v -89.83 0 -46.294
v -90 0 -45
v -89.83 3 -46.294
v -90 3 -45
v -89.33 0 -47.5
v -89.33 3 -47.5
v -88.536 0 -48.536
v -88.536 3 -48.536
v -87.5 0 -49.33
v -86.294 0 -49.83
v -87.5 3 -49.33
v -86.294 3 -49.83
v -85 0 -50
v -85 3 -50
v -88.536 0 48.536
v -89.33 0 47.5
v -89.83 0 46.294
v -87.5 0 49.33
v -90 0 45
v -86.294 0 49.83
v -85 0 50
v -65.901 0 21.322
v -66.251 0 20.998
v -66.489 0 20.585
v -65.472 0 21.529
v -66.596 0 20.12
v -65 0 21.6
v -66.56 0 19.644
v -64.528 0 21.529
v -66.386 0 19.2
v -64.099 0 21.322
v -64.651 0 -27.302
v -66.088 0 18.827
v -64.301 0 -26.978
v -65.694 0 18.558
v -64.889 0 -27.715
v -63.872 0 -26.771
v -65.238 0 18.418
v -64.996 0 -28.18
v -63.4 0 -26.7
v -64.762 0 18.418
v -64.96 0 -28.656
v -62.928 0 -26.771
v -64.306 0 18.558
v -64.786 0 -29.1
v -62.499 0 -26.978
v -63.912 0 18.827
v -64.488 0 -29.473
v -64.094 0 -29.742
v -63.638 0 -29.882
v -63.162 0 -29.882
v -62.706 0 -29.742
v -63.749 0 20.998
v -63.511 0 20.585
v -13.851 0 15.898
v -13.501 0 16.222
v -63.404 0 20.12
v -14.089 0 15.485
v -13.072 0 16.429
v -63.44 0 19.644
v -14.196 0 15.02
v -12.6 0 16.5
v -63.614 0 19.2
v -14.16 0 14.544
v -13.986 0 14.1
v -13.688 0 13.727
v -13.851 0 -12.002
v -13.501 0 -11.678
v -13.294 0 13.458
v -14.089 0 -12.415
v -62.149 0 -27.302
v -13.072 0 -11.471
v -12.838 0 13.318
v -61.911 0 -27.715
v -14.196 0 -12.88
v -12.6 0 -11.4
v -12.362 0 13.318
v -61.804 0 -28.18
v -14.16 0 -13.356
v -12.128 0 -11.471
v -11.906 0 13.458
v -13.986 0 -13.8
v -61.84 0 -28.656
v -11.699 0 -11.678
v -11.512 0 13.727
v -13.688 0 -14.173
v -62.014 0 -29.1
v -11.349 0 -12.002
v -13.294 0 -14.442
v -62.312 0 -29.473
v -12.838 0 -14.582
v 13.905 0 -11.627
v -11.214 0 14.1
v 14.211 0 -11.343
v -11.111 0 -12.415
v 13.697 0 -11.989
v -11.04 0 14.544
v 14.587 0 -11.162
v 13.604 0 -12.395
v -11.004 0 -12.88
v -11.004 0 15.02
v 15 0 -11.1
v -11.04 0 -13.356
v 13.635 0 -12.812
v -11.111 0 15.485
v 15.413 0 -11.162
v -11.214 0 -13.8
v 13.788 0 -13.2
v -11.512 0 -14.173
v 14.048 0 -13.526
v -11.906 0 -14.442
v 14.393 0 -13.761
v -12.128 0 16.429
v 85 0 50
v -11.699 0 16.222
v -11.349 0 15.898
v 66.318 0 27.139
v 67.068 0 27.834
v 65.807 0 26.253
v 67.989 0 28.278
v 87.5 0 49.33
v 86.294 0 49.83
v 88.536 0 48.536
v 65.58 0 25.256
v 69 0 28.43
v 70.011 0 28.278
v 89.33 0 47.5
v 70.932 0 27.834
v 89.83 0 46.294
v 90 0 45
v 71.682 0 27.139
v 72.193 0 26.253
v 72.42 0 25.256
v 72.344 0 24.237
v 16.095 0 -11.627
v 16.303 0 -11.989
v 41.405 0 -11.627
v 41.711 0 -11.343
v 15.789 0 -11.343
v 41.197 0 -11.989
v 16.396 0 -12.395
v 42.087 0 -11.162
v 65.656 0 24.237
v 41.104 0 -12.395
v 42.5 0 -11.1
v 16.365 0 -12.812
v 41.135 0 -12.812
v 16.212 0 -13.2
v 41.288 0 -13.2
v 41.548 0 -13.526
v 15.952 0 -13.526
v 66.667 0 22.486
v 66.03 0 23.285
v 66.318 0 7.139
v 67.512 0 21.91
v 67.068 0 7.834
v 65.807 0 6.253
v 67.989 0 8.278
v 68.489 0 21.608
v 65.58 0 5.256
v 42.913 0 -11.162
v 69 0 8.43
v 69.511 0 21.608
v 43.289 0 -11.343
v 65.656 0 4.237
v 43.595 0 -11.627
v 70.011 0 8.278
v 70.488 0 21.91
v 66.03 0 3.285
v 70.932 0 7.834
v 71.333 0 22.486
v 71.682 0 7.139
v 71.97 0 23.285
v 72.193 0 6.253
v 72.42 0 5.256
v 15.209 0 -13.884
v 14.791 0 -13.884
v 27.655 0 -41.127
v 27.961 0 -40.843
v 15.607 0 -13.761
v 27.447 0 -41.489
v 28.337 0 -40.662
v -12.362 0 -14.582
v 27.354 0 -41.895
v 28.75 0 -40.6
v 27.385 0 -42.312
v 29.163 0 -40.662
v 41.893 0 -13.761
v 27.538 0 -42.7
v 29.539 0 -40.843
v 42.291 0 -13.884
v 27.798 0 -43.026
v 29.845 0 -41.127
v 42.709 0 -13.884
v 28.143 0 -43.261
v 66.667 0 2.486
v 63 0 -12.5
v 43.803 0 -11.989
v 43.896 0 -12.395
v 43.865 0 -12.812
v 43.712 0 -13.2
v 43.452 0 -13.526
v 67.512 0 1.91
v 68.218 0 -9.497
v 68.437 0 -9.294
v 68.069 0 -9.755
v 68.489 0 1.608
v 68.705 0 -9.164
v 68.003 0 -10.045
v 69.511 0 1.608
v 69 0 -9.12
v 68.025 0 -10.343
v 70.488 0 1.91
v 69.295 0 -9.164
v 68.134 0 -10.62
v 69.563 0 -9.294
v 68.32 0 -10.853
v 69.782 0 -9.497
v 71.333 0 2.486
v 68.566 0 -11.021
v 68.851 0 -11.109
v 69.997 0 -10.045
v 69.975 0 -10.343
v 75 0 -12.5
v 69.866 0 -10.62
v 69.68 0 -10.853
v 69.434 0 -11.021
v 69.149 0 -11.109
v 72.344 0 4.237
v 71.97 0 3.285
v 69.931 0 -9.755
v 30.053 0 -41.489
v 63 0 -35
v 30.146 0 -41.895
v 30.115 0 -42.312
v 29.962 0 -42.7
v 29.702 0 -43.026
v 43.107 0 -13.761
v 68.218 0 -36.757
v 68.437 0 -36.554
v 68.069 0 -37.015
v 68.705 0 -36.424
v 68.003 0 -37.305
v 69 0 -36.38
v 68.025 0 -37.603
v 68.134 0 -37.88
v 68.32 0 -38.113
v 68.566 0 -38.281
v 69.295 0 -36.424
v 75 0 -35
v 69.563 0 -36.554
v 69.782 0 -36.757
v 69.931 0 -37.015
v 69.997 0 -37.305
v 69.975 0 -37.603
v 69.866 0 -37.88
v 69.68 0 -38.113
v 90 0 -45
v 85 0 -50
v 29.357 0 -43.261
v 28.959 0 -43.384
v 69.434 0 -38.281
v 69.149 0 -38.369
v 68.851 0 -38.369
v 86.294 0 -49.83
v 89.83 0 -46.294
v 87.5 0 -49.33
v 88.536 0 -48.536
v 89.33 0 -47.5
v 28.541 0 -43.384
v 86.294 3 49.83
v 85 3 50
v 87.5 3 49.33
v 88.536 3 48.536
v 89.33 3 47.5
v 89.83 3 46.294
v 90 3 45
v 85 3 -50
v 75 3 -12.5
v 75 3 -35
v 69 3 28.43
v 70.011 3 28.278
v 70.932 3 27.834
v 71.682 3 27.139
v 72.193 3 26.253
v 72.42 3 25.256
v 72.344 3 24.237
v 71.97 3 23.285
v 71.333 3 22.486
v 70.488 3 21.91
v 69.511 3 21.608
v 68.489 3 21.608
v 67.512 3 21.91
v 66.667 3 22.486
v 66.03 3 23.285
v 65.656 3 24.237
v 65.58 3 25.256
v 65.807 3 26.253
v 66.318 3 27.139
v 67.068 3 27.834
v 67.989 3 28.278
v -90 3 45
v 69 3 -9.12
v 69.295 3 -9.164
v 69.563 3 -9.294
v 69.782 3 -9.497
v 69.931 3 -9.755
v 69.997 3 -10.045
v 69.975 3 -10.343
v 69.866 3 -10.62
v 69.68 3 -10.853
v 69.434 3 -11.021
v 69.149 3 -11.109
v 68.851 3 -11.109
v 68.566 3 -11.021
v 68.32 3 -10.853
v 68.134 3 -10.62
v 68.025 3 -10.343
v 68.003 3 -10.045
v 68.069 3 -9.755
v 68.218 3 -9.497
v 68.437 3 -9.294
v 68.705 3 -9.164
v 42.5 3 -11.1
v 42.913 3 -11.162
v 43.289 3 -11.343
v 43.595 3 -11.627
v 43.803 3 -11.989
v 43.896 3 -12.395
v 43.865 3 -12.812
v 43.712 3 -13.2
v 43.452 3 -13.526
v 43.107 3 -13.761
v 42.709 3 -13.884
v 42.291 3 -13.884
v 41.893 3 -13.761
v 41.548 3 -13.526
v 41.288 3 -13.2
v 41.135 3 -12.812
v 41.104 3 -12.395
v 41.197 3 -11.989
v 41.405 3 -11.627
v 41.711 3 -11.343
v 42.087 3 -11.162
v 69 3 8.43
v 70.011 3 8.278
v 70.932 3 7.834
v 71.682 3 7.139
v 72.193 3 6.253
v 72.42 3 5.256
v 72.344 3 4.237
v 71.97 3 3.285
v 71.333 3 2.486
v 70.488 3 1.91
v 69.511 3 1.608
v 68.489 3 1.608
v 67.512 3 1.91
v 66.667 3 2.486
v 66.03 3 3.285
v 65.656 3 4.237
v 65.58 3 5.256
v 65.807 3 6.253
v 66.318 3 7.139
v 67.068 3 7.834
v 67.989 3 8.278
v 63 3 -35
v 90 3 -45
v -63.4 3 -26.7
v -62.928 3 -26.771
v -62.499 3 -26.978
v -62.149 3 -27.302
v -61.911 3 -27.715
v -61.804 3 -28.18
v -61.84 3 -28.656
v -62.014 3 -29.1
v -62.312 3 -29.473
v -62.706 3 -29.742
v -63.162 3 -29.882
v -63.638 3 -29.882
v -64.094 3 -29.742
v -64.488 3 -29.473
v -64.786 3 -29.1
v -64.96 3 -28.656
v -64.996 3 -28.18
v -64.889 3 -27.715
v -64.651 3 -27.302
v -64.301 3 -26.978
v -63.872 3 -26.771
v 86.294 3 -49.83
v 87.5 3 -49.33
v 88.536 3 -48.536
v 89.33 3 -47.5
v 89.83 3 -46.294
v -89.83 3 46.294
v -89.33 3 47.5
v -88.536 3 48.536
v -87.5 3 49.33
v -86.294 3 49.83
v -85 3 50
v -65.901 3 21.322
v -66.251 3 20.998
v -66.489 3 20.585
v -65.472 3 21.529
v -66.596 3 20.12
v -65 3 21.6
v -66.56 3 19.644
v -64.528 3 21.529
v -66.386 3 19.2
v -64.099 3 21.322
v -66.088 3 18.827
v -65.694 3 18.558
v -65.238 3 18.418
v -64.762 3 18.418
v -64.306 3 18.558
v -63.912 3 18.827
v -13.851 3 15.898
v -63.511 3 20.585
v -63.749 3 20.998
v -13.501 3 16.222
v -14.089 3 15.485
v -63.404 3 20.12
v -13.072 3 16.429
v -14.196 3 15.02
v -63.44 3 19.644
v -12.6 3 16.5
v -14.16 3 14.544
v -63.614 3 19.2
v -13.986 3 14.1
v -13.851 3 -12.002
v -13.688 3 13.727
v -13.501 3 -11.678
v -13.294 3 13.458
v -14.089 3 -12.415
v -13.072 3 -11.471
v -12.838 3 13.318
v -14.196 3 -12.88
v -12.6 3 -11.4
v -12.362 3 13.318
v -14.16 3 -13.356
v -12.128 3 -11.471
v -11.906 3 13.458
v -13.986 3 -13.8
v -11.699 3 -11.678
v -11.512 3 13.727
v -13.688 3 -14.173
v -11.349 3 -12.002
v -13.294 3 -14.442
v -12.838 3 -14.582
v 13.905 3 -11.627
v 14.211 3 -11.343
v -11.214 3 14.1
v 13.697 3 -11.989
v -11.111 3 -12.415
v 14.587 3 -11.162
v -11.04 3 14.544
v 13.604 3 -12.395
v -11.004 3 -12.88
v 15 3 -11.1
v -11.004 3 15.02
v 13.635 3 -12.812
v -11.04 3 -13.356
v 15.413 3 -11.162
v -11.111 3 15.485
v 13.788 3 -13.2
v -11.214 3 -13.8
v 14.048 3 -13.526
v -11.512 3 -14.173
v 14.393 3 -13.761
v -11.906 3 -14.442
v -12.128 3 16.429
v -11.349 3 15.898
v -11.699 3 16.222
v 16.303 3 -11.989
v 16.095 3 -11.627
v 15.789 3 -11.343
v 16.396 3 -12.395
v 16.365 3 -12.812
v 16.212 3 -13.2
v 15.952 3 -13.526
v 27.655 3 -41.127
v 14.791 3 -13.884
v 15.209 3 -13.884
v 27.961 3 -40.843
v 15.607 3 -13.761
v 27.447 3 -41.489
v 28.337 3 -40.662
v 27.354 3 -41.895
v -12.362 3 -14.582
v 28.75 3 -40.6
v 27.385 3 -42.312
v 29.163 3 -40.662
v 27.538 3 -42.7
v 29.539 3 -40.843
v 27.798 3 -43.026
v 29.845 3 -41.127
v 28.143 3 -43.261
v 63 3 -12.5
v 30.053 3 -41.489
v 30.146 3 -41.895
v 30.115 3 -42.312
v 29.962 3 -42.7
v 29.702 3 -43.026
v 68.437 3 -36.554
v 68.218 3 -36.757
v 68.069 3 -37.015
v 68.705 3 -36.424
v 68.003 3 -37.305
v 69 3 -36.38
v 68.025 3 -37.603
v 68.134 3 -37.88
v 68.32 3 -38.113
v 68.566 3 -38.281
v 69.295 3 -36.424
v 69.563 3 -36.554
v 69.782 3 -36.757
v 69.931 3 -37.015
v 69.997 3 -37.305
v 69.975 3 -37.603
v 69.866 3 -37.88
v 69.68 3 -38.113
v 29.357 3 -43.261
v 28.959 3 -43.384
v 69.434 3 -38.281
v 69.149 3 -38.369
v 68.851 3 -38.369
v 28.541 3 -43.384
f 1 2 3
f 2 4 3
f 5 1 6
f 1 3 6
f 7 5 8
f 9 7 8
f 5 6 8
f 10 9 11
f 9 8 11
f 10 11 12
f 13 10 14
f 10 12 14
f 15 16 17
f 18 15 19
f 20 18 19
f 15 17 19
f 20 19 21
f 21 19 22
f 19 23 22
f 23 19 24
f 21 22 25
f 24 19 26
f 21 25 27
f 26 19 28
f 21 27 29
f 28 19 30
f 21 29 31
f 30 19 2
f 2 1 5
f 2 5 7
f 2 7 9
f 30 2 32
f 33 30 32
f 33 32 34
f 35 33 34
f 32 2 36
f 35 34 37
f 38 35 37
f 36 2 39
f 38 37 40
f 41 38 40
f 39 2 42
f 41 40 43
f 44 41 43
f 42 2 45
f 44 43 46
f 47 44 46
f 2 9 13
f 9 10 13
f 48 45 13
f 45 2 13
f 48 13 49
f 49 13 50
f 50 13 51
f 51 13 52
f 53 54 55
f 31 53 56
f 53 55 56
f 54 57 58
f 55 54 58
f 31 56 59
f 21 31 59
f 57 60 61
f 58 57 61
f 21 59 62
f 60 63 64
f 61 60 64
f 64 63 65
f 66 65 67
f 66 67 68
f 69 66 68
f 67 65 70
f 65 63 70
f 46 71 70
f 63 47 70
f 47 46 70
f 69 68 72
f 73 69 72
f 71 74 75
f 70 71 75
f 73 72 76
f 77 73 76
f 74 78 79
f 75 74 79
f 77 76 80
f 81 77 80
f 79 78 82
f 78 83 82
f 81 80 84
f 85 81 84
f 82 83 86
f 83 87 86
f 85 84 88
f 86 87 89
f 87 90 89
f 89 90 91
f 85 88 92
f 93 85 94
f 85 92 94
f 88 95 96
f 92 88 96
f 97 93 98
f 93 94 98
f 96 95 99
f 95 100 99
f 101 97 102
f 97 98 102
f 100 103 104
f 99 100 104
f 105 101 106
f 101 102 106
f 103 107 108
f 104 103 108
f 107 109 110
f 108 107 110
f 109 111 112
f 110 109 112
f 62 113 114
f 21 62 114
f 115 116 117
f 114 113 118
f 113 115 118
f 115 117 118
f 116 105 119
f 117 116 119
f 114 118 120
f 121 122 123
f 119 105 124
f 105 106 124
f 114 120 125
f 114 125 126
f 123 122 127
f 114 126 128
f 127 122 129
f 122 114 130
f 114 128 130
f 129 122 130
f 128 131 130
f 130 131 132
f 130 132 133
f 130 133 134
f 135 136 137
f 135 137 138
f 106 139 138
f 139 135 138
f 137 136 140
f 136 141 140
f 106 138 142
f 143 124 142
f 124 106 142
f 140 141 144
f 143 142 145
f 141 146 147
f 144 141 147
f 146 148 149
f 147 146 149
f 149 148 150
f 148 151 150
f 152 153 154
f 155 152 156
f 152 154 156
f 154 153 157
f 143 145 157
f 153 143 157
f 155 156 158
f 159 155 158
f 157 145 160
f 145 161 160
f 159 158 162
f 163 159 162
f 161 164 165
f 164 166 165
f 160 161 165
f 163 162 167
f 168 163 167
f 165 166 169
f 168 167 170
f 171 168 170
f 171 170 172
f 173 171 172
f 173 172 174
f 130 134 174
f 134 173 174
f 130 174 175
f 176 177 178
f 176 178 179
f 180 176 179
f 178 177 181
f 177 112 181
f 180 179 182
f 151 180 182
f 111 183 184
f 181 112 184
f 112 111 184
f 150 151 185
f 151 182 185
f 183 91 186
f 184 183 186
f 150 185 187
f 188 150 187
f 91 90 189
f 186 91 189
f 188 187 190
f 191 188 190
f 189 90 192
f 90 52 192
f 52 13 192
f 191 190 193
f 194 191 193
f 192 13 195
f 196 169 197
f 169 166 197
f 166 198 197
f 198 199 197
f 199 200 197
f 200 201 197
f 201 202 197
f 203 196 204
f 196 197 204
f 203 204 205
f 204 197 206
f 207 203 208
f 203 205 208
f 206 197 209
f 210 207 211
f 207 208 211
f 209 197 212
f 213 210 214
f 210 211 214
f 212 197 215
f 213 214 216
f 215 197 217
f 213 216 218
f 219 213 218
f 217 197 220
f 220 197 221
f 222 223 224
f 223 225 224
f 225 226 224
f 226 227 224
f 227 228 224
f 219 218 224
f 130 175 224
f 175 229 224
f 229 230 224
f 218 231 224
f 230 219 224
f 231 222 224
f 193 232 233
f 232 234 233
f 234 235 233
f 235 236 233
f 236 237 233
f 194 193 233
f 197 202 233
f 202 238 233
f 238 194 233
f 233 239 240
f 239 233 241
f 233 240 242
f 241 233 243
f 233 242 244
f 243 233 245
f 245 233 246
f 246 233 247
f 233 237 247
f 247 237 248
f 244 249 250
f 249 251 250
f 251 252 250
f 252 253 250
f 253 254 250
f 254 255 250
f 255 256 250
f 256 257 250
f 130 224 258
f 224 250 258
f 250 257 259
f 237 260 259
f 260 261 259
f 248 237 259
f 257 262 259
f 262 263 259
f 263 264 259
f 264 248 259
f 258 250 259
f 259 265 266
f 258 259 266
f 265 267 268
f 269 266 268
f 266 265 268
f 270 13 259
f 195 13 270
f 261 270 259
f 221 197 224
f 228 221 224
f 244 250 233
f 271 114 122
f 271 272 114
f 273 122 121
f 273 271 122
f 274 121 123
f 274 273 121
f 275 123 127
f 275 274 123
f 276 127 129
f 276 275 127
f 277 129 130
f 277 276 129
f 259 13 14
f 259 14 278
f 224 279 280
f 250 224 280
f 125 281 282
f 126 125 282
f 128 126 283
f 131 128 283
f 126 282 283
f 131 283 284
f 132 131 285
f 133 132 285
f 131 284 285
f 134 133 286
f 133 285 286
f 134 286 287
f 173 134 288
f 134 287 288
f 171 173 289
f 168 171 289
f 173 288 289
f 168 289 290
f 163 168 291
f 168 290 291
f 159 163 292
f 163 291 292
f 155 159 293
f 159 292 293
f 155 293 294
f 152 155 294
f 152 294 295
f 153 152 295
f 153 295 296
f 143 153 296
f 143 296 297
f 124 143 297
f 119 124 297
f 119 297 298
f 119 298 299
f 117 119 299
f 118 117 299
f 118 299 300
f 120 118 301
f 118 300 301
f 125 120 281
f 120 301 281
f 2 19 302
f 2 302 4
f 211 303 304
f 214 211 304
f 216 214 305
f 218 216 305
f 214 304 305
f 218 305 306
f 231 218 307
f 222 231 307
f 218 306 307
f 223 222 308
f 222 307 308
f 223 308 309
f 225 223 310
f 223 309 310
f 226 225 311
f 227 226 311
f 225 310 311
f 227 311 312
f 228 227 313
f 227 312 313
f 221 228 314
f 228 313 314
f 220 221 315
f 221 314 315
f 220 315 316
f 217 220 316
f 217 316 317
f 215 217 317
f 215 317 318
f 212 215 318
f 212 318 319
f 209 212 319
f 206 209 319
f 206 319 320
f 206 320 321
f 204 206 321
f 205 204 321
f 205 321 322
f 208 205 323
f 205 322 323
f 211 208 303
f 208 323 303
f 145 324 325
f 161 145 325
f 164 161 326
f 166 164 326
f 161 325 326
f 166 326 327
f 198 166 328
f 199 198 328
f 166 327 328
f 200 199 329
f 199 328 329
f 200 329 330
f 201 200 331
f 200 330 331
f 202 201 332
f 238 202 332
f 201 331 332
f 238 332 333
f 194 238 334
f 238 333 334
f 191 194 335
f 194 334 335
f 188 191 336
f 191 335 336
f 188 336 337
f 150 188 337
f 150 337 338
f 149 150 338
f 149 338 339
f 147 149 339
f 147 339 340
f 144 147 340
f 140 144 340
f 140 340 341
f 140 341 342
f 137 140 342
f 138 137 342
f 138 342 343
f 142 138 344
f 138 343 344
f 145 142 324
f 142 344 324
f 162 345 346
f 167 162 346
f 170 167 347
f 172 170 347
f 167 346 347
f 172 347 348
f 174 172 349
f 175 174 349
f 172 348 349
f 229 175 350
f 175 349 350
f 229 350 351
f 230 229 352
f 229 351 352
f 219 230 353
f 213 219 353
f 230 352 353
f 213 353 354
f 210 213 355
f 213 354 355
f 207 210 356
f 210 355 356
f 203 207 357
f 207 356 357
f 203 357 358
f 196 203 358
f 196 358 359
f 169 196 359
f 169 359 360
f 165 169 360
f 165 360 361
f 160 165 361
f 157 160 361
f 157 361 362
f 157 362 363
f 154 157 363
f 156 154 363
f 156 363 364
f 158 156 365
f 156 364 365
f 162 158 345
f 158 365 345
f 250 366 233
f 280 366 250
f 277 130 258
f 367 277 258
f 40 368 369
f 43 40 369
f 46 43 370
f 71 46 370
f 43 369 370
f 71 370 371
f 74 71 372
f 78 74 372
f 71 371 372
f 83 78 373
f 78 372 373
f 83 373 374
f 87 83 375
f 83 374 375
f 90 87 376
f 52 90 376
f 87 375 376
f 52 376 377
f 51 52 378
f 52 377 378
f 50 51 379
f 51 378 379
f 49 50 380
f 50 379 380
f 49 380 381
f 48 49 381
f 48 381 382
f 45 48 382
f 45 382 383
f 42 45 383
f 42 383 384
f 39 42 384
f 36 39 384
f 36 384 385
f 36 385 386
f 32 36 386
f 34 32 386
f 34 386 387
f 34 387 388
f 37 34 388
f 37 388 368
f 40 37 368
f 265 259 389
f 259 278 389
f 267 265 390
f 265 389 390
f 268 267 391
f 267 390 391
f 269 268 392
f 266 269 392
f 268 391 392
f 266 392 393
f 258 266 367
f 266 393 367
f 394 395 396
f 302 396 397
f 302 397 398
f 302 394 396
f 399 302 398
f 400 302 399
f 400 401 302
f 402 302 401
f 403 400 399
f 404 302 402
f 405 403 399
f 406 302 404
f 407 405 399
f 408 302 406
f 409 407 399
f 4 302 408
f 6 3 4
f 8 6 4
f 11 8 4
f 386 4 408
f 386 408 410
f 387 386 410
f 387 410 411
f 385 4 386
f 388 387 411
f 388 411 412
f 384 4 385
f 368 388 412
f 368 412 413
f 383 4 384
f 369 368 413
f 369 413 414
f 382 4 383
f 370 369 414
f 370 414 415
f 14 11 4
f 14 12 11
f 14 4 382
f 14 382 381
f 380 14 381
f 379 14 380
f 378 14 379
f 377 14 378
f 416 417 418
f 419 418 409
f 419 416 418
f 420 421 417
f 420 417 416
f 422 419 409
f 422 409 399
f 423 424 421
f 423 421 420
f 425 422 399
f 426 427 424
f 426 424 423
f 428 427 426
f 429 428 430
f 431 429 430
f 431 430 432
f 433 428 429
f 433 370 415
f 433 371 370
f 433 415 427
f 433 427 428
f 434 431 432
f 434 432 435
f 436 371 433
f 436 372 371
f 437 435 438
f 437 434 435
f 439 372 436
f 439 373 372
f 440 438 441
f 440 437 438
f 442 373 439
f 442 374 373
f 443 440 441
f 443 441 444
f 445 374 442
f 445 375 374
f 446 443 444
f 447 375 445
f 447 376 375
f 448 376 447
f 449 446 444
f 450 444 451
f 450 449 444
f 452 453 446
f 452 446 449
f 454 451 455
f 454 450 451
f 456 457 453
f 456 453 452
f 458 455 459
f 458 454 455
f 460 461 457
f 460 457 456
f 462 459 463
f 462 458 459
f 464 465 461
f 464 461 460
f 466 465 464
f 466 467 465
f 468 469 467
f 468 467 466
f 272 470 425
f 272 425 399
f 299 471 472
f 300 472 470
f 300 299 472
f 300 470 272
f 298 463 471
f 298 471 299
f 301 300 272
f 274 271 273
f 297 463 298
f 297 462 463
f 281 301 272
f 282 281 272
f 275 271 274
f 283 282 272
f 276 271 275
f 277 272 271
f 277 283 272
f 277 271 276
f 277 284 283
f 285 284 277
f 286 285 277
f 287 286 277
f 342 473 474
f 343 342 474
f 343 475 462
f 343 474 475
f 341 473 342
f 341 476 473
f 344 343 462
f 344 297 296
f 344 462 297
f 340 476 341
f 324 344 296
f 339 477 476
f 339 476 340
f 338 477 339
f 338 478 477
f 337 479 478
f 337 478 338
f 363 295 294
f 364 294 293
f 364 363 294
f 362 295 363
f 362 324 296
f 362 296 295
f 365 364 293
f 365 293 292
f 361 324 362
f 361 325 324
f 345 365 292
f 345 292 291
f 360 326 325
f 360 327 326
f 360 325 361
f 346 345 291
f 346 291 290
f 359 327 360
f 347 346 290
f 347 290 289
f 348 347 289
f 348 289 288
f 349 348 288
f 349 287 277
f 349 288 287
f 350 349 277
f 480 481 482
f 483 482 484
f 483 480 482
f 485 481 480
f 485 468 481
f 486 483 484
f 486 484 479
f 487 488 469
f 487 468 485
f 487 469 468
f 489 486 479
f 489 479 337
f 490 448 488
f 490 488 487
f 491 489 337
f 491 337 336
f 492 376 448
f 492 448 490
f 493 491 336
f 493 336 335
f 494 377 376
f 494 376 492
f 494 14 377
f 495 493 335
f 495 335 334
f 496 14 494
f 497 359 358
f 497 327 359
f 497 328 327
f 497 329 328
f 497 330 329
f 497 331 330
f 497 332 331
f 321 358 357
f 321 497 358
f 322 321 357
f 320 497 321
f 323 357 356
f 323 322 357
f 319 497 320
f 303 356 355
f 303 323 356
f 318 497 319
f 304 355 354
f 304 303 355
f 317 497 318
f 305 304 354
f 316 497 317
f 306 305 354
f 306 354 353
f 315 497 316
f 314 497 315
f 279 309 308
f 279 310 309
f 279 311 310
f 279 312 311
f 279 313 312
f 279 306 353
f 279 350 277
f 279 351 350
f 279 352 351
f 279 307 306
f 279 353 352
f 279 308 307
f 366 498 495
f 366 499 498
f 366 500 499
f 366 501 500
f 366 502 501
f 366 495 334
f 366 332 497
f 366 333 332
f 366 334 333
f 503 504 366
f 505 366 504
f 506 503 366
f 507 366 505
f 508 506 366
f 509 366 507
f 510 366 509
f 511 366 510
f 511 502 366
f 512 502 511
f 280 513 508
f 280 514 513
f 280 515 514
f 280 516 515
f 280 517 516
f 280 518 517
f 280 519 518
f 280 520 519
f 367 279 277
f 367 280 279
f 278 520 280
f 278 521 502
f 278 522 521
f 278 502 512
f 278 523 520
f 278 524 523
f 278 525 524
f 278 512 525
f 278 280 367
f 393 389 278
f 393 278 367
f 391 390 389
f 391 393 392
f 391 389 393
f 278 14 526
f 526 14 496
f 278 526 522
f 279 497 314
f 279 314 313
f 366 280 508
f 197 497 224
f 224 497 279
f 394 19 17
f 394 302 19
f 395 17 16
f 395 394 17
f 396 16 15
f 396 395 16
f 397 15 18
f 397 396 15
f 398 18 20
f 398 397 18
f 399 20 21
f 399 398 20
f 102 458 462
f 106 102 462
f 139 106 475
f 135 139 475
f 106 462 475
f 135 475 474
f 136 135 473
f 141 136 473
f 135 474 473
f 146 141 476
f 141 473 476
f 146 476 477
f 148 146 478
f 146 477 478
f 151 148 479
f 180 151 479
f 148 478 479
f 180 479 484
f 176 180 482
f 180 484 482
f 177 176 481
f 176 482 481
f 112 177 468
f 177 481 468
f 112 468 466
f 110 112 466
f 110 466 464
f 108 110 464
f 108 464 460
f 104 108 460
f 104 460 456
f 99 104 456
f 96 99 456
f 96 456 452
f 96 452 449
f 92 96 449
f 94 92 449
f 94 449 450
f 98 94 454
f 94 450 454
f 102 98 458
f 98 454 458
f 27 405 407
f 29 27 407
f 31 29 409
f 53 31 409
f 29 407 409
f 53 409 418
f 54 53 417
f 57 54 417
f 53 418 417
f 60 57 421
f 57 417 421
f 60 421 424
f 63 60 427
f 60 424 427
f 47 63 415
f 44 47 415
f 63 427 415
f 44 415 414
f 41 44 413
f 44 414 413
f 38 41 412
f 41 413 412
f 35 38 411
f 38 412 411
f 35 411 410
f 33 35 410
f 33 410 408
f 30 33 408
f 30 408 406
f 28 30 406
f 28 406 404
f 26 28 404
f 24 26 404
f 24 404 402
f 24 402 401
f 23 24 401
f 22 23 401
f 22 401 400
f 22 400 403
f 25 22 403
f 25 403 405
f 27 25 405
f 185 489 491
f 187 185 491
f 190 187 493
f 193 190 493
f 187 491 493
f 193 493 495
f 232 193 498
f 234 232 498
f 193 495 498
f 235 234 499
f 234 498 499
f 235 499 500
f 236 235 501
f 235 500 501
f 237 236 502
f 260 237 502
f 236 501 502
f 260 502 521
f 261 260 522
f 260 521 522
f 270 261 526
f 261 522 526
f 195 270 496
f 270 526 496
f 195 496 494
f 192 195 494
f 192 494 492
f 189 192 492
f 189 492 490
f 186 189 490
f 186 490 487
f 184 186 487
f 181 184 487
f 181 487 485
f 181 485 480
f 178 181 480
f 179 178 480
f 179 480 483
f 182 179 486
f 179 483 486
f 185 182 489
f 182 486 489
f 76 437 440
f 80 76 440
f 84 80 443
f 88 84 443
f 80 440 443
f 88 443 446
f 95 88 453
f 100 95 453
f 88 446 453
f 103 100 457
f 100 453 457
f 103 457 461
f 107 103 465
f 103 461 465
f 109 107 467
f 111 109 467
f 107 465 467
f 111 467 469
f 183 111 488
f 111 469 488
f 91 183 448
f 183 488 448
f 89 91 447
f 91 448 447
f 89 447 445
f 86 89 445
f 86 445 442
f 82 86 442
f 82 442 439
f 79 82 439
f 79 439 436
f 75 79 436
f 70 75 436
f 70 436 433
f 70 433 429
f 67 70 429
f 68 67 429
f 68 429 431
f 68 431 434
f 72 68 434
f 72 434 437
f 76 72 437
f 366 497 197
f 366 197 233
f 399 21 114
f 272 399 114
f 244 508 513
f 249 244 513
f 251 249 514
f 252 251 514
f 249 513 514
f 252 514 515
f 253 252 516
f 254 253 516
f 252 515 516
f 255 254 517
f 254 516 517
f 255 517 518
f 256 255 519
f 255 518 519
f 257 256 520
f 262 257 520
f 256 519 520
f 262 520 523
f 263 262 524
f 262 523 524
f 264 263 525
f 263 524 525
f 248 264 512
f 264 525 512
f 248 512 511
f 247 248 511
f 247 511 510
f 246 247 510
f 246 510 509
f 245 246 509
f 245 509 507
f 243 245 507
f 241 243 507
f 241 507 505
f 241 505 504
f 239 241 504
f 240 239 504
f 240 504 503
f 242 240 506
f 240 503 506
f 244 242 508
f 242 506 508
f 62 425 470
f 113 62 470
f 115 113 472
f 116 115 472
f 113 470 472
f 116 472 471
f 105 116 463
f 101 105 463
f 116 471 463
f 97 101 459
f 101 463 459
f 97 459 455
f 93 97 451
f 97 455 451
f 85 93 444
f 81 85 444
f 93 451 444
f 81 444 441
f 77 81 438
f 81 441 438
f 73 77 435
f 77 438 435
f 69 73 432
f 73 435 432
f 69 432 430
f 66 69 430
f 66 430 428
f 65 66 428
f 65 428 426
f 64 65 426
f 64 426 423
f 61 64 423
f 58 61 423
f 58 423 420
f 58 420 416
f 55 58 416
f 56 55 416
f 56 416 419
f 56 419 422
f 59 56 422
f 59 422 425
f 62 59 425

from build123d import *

# Parameters (mm, degrees)
SKETCH1_W           = 180
SKETCH1_H           = 100
BOSS_EXTRUDE1_DEPTH = 3
SKETCH2_R           = 1.6
CUT_EXTRUDE1_DEPTH  = 10
FILLET1_R           = 5
SKETCH3_R           = 1
SKETCH3_R_2         = 3.43
SKETCH3_R_3         = 1.4
SKETCH3_W           = 12
SKETCH3_H           = 22.5
CUT_EXTRUDE2_DEPTH  = 3


with BuildPart() as part:
    # Sketch1 → Boss-Extrude1 (new body)
    with BuildSketch(Plane(origin=(0, 0, 0), x_dir=(1, 0, 0), z_dir=(0, 1, 0))):
        Rectangle(SKETCH1_W, SKETCH1_H)
    extrude(amount=BOSS_EXTRUDE1_DEPTH)

    # Sketch2 → Cut-Extrude1 (cut)
    with BuildSketch(Plane(origin=(0, 3, 0), x_dir=(1, 0, 0), z_dir=(0, 1, 0))):
        with Locations(Location((-65, -20, 0), (0, 0, 270))):
            Circle(SKETCH2_R)
        with Locations(Location((-63.4, 28.3, 0), (0, 0, 270))):
            Circle(SKETCH2_R)
        with Locations(Location((-12.6, 13, 0), (0, 0, 270))):
            Circle(SKETCH2_R)
        with Locations(Location((-12.6, -14.9, 0), (0, 0, 270))):
            Circle(SKETCH2_R)
    extrude(amount=-CUT_EXTRUDE1_DEPTH, mode=Mode.SUBTRACT)

    # Fillet1
    fillet1_edges = [part.edges().sort_by_distance(p)[0] for p in [
        (90, 1.5, 50),
        (-90, 1.5, 50),
        (-90, 1.5, -50),
        (90, 1.5, -50),
    ]]
    fillet(fillet1_edges, radius=FILLET1_R)

    # Sketch3 → Cut-Extrude2 (cut)
    with BuildSketch(Plane(origin=(0, 3, 0), x_dir=(1, 0, 0), z_dir=(0, 1, 0))):
        with Locations(Location((69, 10.12, 0), (0, 0, 270))):
            Circle(SKETCH3_R)
        with Locations(Location((69, 37.38, 0), (0, 0, 270))):
            Circle(SKETCH3_R)
        with Locations(Location((69, -25, 0), (0, 0, 270))):
            Circle(SKETCH3_R_2)
        with Locations(Location((69, -5, 0), (0, 0, 270))):
            Circle(SKETCH3_R_2)
        with Locations(Location((42.5, 12.5, 0), (0, 0, 270))):
            Circle(SKETCH3_R_3)
        with Locations(Location((15, 12.5, 0), (0, 0, 270))):
            Circle(SKETCH3_R_3)
        with Locations(Location((28.75, 42, 0), (0, 0, 270))):
            Circle(SKETCH3_R_3)
        with Locations((69, 23.75)):
            Rectangle(SKETCH3_W, SKETCH3_H)
    extrude(amount=-CUT_EXTRUDE2_DEPTH, mode=Mode.SUBTRACT)


solid = part.part
